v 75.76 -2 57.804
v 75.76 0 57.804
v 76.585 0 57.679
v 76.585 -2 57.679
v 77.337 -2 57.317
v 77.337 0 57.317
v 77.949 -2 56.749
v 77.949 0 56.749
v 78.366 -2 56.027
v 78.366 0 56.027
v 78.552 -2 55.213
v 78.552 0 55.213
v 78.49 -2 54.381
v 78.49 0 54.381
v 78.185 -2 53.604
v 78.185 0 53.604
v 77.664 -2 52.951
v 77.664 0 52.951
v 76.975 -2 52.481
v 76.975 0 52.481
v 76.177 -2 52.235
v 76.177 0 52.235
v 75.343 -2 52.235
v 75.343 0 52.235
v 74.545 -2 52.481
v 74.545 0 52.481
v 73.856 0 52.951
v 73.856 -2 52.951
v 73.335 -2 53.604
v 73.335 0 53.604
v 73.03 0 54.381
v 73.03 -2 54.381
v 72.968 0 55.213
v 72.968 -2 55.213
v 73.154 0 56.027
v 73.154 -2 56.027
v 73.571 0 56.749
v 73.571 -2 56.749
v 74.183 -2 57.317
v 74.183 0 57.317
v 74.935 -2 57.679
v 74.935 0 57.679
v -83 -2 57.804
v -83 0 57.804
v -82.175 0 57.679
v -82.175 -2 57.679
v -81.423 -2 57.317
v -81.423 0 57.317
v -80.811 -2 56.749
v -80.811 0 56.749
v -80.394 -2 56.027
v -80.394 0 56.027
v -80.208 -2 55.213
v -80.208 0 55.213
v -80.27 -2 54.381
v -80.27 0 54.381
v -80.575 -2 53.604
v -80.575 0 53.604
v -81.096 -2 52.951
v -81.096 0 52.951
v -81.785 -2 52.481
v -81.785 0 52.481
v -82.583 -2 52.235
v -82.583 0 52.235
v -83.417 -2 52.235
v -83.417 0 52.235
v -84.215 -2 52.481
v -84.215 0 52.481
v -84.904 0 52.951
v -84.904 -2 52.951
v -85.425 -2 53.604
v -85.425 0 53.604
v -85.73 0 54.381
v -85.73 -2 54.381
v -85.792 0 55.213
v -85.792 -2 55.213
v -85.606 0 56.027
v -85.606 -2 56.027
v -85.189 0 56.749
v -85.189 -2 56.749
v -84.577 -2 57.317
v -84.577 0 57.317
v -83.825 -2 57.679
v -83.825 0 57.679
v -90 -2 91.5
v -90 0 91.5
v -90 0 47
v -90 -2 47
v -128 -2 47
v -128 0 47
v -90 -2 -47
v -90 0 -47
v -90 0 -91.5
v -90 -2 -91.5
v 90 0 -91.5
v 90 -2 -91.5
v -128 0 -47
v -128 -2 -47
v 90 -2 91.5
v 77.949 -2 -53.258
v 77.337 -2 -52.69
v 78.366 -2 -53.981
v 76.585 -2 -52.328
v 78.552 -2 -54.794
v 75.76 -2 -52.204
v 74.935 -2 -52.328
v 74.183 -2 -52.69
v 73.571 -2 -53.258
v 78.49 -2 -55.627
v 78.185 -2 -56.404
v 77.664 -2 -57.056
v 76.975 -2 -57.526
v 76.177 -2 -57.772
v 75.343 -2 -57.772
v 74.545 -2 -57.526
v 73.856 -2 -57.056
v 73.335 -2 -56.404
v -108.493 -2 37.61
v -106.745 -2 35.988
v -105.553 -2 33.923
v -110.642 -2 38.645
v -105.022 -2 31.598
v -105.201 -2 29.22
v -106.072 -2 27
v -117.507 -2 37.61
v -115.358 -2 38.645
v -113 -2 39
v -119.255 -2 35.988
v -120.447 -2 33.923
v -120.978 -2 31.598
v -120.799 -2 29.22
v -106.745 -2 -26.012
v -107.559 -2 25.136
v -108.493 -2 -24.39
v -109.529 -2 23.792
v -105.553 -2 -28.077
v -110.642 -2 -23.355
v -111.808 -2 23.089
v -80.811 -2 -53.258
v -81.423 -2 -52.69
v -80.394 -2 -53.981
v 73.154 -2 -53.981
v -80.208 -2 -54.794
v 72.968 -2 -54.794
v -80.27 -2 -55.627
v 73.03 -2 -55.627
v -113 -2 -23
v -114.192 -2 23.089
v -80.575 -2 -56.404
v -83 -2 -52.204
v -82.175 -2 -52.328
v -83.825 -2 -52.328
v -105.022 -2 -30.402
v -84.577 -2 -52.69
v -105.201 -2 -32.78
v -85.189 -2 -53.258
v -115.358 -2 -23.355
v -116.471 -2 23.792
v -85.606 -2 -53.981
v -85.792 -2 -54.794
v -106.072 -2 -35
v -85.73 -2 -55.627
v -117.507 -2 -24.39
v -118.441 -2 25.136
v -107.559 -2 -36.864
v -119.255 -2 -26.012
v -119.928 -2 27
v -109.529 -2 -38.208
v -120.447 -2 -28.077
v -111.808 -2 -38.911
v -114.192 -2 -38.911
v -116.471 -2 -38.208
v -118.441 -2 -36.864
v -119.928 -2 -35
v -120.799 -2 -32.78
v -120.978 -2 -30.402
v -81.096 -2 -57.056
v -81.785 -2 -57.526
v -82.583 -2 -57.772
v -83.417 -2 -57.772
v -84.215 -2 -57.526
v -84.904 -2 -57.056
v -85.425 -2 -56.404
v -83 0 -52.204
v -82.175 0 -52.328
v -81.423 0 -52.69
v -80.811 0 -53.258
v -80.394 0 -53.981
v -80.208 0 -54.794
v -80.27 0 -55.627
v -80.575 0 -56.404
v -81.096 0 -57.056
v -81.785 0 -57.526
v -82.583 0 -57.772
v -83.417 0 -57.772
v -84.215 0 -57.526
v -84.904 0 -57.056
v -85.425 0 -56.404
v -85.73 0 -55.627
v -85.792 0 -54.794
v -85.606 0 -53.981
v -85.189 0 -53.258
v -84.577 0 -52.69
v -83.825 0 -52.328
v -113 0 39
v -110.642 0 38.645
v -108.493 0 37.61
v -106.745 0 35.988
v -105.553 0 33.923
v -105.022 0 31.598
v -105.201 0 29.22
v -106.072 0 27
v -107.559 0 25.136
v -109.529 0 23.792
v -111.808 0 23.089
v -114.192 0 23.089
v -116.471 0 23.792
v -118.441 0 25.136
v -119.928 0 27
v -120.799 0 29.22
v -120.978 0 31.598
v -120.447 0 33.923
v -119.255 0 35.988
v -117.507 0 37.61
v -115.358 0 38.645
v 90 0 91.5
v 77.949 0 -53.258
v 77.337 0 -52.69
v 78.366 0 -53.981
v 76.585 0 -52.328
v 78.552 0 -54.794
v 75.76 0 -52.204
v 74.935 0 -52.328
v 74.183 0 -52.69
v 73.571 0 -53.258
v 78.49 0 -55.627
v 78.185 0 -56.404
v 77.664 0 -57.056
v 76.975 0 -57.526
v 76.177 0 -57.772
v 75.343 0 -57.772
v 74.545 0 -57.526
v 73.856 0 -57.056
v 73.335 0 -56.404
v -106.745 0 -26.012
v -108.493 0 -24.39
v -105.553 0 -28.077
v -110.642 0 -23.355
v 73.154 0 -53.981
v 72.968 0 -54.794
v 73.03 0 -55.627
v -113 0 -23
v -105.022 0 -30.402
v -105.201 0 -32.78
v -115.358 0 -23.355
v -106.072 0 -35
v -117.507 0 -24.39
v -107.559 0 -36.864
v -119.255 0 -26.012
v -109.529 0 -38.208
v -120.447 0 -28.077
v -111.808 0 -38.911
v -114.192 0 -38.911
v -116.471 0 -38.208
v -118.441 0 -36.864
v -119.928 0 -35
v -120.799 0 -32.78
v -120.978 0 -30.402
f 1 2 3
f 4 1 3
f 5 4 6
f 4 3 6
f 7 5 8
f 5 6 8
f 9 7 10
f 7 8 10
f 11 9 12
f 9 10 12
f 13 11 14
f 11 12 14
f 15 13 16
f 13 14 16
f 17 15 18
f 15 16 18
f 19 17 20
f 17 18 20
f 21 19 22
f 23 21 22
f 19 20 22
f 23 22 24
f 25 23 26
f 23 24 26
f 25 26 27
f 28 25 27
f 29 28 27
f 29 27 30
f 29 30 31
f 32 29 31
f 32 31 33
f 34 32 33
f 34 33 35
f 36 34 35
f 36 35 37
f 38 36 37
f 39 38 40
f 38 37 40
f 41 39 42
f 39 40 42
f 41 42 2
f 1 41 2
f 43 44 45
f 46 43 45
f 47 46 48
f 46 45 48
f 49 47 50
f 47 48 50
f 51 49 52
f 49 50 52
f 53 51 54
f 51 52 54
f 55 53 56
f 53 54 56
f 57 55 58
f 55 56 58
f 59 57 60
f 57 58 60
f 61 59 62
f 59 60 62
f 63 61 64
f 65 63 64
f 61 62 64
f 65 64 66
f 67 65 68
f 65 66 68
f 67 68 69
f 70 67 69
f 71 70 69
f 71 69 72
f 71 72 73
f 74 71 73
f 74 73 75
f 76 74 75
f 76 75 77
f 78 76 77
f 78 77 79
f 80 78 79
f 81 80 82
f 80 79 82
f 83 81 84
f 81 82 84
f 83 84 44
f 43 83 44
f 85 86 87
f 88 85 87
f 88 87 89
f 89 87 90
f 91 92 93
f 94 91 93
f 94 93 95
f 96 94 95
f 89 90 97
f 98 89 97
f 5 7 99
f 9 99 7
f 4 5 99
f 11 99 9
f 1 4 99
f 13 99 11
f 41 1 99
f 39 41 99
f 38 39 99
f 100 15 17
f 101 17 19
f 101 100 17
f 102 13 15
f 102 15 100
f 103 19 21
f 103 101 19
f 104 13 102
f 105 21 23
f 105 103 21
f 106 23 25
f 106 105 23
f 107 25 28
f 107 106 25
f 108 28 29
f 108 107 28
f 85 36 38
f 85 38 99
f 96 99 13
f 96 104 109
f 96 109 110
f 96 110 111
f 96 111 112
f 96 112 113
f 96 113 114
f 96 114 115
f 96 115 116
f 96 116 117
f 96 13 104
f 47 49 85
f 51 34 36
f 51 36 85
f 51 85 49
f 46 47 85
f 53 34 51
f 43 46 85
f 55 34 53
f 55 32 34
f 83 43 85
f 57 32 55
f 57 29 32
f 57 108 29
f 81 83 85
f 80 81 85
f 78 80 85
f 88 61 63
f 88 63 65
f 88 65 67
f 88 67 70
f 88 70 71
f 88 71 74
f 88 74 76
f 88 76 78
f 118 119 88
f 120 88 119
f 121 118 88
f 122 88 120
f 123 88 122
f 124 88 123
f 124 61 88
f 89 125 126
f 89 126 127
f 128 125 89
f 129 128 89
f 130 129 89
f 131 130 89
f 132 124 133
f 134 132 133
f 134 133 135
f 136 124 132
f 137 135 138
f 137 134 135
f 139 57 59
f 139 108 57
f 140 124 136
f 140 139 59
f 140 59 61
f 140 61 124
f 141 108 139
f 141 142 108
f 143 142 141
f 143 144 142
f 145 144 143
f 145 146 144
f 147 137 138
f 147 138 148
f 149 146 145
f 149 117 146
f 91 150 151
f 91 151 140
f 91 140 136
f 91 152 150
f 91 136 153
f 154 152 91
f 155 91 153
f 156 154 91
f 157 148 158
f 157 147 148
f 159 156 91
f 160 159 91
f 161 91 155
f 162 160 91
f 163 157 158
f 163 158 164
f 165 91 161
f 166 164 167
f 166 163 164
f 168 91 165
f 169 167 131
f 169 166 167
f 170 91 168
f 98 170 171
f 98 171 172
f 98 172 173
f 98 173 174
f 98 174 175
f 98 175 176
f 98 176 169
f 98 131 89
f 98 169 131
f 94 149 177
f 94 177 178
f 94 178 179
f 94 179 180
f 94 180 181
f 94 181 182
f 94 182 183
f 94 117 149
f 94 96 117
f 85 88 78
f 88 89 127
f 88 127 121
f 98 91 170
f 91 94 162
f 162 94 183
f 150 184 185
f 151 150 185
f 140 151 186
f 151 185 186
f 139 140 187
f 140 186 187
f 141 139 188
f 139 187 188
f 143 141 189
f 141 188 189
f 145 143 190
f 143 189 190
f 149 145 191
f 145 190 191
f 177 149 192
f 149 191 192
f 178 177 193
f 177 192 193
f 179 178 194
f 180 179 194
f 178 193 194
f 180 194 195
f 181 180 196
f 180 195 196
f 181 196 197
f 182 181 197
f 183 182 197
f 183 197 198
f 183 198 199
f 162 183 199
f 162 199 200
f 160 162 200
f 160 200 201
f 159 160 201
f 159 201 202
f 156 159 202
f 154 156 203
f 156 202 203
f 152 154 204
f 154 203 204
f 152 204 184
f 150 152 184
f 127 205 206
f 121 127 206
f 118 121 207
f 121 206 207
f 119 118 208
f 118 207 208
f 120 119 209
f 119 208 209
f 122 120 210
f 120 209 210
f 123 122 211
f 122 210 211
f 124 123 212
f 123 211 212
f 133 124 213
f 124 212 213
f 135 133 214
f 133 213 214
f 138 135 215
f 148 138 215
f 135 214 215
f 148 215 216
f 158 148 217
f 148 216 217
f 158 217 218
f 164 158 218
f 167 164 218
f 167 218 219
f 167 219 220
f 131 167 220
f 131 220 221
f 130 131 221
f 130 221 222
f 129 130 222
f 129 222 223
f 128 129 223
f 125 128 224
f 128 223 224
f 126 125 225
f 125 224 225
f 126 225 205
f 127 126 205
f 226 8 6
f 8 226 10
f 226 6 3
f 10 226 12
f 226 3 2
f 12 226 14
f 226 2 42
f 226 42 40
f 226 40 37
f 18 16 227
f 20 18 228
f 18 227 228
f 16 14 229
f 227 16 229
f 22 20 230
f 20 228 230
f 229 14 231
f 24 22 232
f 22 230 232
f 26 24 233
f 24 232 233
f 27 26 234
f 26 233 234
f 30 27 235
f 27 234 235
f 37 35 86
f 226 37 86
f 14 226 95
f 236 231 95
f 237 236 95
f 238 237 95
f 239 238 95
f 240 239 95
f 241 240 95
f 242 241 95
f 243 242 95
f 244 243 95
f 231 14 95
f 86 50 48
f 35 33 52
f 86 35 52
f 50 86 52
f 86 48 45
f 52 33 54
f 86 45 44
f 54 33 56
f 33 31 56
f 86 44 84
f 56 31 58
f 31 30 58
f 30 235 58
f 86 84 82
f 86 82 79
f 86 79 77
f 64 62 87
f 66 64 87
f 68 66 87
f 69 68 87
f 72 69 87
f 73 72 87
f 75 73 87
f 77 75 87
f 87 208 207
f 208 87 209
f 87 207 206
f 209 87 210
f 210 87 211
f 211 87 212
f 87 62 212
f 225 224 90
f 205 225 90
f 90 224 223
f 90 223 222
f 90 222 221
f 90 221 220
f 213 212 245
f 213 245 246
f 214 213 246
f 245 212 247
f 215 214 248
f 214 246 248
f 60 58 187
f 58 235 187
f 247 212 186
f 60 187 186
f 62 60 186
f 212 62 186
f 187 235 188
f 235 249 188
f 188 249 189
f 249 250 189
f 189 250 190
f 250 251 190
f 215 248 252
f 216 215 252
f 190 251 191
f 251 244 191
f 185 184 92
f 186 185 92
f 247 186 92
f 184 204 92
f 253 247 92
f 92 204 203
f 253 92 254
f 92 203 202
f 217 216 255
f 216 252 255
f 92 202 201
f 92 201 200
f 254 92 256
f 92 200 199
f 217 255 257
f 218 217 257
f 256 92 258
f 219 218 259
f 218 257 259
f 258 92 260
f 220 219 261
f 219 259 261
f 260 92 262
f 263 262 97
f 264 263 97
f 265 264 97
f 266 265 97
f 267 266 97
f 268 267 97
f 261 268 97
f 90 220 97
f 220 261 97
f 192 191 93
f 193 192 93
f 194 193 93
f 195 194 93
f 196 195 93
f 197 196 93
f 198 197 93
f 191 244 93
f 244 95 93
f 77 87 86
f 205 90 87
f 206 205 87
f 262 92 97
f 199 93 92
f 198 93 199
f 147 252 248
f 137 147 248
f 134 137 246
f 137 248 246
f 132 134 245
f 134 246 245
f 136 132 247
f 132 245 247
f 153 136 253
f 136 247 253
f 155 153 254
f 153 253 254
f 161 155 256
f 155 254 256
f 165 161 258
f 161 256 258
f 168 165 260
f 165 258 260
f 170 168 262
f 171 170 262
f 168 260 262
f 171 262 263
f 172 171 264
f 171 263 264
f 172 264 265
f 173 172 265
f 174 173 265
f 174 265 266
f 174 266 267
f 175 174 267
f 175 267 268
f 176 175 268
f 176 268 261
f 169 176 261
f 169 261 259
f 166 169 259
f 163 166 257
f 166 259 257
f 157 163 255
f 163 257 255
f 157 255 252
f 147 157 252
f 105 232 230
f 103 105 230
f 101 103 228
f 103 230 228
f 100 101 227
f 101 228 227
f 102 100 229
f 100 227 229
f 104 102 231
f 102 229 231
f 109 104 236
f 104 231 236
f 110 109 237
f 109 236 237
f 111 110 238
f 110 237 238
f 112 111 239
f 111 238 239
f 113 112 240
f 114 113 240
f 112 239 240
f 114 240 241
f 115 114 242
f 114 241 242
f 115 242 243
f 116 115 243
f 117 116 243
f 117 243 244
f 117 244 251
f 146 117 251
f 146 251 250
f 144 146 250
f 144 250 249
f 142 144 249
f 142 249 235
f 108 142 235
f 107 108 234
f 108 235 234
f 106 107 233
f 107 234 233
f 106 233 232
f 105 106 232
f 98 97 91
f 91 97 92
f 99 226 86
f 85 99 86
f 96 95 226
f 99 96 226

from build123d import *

# Parameters (mm, degrees)
SKETCH1_R          = 2.8
SKETCH1_R_2        = 8
BASE_FLANGE1_DEPTH = 2


# Sheet-metal steps are written as plain solids
with BuildPart() as part:
    # Sketch1 → Base-Flange1 (new body)
    with BuildSketch(Plane(origin=(0, 0, 0), x_dir=(1, 0, 0), z_dir=(0, 1, 0))):
        Polygon((-90, 91.5), (90, 91.5), (90, -91.5), (-90, -91.5), (-90, -47), (-128, -47), (-128, 47), (-90, 47), align=None)
        with Locations(Location((-83, 55.0037, 0), (0, 0, 270))):
            Circle(SKETCH1_R, mode=Mode.SUBTRACT)
        with Locations(Location((-83, -55.0037, 0), (0, 0, 270))):
            Circle(SKETCH1_R, mode=Mode.SUBTRACT)
        with Locations(Location((75.76, -55.0037, 0), (0, 0, 270))):
            Circle(SKETCH1_R, mode=Mode.SUBTRACT)
        with Locations(Location((75.76, 55.0037, 0), (0, 0, 270))):
            Circle(SKETCH1_R, mode=Mode.SUBTRACT)
        with Locations(Location((-113, 31, 0), (0, 0, 270))):
            Circle(SKETCH1_R_2, mode=Mode.SUBTRACT)
        with Locations(Location((-113, -31, 0), (0, 0, 270))):
            Circle(SKETCH1_R_2, mode=Mode.SUBTRACT)
    extrude(amount=-BASE_FLANGE1_DEPTH)


solid = part.part
